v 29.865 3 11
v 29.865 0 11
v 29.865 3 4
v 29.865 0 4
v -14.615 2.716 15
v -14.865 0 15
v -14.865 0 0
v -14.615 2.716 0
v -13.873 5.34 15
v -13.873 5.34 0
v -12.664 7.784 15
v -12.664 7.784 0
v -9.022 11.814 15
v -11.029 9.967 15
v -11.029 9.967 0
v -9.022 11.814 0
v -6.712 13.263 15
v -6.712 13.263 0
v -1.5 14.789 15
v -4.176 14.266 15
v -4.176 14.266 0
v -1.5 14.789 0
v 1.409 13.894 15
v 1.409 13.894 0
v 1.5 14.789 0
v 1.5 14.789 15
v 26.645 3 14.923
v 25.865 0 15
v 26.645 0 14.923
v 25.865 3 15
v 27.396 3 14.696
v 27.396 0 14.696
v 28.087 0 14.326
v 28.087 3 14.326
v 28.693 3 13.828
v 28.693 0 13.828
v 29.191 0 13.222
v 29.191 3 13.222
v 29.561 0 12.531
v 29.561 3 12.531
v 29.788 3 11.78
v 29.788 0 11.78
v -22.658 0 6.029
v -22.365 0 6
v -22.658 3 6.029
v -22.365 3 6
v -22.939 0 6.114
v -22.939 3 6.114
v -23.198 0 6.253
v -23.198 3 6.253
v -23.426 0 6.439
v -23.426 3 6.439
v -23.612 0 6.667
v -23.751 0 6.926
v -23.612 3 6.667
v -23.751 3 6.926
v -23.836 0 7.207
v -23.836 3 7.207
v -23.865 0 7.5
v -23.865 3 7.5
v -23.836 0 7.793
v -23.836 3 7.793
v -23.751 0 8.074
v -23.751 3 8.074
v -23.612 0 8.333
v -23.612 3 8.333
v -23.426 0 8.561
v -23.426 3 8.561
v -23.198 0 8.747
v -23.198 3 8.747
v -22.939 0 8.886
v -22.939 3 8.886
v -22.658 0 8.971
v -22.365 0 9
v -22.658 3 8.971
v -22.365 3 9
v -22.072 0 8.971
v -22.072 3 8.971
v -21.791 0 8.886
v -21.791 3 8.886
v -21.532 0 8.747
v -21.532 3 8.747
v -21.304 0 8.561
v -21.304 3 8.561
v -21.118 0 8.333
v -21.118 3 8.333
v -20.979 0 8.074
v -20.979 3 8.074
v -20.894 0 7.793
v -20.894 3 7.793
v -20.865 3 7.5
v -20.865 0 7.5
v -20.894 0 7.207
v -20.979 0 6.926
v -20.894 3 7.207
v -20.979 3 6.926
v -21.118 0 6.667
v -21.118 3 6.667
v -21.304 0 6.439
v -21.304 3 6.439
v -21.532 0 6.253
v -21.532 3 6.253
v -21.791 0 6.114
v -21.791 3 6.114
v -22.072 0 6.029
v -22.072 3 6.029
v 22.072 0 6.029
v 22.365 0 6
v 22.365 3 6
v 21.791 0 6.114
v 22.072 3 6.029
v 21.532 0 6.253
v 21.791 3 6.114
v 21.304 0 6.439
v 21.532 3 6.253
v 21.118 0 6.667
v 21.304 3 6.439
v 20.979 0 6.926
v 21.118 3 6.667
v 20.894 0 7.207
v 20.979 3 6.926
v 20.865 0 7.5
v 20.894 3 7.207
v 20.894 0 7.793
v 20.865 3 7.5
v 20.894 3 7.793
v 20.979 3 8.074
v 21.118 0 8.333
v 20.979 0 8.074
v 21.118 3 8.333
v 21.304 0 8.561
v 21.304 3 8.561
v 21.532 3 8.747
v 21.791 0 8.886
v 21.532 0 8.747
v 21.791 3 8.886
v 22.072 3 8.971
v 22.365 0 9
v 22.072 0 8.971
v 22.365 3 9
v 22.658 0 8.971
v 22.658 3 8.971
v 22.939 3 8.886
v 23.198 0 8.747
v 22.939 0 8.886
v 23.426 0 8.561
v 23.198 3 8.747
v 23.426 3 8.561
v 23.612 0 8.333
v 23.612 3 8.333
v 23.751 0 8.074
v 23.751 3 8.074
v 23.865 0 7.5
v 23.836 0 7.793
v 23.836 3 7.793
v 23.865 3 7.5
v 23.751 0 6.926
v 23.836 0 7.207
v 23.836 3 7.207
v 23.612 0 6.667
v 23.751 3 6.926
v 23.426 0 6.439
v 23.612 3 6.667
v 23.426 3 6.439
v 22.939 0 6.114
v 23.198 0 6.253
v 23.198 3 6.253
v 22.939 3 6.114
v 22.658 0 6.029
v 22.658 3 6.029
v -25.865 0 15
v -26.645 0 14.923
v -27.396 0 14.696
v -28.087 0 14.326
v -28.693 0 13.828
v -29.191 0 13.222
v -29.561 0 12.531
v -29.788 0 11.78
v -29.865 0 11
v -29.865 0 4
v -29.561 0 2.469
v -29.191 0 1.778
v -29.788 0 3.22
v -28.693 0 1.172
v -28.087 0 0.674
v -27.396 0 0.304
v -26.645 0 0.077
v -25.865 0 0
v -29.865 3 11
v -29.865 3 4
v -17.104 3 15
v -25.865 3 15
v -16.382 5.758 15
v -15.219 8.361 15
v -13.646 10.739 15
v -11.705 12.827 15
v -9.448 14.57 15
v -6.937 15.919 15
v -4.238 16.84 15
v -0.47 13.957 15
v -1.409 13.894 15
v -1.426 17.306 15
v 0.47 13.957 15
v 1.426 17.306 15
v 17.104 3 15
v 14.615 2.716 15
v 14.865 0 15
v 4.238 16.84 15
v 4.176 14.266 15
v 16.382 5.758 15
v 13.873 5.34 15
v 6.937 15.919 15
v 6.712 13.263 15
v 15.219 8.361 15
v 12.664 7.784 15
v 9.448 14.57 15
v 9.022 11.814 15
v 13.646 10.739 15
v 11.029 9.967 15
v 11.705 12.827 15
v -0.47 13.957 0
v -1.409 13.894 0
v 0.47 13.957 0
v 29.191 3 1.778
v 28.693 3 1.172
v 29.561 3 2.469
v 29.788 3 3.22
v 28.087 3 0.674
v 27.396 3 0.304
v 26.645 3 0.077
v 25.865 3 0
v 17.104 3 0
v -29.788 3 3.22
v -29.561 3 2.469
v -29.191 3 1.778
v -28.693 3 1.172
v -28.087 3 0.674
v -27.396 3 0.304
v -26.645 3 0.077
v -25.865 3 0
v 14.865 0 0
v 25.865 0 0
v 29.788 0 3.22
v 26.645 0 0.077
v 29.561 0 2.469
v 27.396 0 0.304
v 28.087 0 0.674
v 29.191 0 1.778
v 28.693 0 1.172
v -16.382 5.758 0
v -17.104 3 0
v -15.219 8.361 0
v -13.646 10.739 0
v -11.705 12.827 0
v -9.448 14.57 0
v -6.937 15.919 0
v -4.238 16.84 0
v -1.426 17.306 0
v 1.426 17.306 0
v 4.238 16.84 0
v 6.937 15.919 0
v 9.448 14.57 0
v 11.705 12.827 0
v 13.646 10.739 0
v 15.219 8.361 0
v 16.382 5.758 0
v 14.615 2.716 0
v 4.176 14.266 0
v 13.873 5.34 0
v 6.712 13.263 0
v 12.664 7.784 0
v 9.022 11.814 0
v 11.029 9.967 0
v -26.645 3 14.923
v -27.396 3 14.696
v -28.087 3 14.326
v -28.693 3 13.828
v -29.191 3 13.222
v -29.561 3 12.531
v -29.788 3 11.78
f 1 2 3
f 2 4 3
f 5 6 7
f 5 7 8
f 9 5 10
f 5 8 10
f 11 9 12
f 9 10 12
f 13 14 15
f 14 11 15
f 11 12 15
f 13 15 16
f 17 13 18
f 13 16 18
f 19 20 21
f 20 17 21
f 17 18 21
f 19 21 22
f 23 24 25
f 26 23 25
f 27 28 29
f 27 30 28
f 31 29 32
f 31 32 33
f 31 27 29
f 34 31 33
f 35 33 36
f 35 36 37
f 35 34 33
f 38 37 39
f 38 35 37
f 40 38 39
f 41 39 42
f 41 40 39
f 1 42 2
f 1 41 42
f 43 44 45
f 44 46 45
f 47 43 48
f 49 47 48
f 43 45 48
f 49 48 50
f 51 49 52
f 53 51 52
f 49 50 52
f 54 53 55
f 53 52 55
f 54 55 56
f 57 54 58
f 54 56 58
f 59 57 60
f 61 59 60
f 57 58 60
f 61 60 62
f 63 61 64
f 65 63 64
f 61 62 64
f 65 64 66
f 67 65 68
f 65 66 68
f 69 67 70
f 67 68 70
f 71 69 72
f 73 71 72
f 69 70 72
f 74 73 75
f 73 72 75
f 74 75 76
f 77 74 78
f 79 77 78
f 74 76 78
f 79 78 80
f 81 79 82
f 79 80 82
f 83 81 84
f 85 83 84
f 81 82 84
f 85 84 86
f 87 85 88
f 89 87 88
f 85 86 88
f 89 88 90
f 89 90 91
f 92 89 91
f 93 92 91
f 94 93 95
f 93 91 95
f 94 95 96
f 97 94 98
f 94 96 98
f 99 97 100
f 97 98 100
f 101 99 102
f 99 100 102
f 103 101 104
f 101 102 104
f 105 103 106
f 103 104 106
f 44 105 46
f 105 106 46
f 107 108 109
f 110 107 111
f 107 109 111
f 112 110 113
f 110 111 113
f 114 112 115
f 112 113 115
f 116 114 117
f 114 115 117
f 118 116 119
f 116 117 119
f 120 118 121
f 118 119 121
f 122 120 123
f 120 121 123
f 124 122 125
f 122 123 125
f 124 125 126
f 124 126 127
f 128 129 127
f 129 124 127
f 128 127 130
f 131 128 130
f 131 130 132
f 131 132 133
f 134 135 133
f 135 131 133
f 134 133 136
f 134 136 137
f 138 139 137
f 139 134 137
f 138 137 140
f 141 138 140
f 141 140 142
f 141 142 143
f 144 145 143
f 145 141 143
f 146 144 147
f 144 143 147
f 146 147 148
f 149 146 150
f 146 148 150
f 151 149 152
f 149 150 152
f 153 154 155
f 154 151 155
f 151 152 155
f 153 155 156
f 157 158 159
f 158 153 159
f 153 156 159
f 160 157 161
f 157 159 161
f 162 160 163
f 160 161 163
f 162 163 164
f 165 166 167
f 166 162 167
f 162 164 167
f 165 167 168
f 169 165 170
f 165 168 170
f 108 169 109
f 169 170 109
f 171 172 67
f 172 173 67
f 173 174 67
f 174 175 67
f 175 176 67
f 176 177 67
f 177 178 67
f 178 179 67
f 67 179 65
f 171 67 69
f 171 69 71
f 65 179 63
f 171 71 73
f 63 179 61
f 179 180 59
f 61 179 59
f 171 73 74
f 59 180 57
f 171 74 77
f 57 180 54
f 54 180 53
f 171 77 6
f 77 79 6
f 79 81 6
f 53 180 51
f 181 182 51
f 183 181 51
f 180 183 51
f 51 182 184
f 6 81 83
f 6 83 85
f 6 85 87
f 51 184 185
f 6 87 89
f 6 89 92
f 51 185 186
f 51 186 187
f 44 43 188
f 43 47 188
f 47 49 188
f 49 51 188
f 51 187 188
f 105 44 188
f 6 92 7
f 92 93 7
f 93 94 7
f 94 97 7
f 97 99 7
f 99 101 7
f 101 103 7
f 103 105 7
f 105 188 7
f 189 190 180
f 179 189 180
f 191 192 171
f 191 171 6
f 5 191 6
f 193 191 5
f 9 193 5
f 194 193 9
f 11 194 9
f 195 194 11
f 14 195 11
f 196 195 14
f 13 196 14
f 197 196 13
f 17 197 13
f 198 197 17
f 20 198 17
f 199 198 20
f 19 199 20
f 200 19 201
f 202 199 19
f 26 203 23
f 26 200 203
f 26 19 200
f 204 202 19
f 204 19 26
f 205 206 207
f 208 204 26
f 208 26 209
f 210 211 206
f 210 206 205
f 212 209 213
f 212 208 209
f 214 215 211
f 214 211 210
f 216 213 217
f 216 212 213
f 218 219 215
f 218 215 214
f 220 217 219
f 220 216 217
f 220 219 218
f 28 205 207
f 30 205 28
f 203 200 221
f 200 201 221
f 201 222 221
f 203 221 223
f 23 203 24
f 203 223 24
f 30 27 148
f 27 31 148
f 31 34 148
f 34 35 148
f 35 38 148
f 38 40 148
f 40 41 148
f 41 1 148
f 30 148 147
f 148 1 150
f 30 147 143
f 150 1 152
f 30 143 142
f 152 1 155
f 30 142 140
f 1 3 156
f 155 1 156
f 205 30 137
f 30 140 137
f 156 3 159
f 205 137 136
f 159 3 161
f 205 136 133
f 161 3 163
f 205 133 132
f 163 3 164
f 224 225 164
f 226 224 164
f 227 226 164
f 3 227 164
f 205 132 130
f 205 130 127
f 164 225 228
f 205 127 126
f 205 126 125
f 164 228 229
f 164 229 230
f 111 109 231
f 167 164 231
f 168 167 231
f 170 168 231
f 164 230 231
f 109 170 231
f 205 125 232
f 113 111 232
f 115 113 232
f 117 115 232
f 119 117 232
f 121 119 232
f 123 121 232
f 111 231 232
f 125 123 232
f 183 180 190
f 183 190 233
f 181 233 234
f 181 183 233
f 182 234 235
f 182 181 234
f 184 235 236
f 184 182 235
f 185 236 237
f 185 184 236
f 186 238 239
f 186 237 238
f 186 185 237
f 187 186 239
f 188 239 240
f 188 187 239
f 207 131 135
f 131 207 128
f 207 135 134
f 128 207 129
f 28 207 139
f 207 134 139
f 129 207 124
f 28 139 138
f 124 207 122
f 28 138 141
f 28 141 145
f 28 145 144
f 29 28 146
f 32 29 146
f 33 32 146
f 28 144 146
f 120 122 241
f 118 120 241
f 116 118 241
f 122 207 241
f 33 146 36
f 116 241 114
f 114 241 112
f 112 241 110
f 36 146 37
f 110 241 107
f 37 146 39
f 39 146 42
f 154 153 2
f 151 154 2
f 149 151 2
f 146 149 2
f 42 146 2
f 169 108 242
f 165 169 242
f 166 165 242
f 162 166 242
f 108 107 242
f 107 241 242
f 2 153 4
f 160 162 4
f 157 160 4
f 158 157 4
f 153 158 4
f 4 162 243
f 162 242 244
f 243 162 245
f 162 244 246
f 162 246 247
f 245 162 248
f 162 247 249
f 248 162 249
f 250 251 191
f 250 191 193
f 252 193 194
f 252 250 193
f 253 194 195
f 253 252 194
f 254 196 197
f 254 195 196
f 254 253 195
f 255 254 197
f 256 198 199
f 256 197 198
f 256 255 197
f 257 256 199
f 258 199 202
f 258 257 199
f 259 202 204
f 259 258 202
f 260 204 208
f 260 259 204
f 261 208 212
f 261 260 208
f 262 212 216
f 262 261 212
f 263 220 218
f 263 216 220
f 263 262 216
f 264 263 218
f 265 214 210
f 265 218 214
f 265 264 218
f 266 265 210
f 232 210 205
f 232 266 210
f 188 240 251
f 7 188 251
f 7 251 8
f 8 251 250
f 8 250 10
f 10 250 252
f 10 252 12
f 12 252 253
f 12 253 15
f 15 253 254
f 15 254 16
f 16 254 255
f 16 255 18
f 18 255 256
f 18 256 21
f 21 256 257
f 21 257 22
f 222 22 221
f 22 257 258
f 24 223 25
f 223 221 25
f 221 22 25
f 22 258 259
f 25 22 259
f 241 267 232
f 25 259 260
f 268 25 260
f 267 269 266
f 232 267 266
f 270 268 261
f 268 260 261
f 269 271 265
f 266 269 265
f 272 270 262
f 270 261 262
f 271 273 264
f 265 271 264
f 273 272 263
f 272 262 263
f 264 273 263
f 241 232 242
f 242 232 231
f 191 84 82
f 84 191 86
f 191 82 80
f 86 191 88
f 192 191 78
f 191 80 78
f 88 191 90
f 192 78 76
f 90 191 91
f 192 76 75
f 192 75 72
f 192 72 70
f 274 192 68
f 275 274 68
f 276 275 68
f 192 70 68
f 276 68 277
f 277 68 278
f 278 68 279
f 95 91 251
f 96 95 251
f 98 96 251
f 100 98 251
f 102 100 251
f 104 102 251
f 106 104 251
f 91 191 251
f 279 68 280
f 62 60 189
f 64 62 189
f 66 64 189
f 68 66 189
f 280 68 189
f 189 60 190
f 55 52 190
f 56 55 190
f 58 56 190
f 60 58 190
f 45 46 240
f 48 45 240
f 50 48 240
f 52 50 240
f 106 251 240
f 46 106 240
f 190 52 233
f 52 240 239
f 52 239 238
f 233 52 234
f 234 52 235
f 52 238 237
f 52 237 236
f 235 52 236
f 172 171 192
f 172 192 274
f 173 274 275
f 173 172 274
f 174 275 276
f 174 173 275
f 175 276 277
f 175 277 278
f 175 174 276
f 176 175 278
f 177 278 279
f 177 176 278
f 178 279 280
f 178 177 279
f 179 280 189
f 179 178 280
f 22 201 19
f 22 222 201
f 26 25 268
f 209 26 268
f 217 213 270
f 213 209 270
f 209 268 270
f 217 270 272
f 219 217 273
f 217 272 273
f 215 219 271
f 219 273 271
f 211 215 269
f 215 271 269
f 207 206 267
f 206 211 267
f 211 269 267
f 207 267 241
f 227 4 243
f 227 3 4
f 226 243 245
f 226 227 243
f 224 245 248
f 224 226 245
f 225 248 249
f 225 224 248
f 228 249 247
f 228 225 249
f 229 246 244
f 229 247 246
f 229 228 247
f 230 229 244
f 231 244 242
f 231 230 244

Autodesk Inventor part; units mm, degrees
ref_plane "YZ Plane" through (0, 0, 0) normal (1, 0, 0) x (0, 1, 0)
ref_plane "XZ Plane" through (0, 0, 0) normal (0, 1, 0) x (-1, 0, 0)
ref_plane "XY Plane" through (0, 0, 0) normal (0, 0, 1) x (1, 0, 0)
sketch "Sketch1" plane through (0, 0, 0) normal (0, 0, 1) x (1, 0, 0)
  arc A0 (14.865, 0) -> (-14.865, 0) centre (0, 0) ccw
  arc A1 (17.1039, 3) -> (-17.1039, 3) centre (0, 0) ccw
  line L0 (-17.1039, 3) -> (-29.865, 3)
  line L1 (-29.865, 3) -> (-29.865, 0)
  line L2 (-29.865, 0) -> (-14.865, 0)
  line L3 (14.865, 0) -> (29.865, 0)
  line L4 (29.865, 0) -> (29.865, 3)
  line L5 (29.865, 3) -> (17.1039, 3)
  arc A2 (1.4092, 13.8937) -> (-1.4092, 13.8937) centre (0, 0) ccw
  line L6 (-1.4092, 13.8937) -> (-1.5, 14.7891)
  line L7 (1.4092, 13.8937) -> (1.5, 14.7891)
  point P0 (0, 13.965)
  dimension "d0" = 3
  dimension "d1" = 14.865
  dimension "d3" = 2.5
  dimension "d8" = 15
  dimension "d17" = 0.9
  dimension "d18" = 3
extrude "Extrusion1" add sketch "Sketch1" along normal blind 15
sketch "Sketch2" plane through (-29.865, 0, 0) normal (0, -1, 0) x (1, 0, 0)
  line L0 (0, 15) -> (15, 15) projected
  line L1 (0, 0) -> (0, 15) projected
  point P0 (29.865, 0)
  point P1 (7.5, 7.5)
  point P2 (7.5, 15)
  point P3 (0, 7.5)
hole "Hole1" at (-22.365, 0, 7.5) direction (0, 1, 0) diameter 3 end through all
mirror "Mirror1" about plane through (0, 0, 0) normal (1, 0, 0) of "Hole1"
fillet "Fillet1" radius 4 4 edges at (-29.865, 1.5, 0) (-29.865, 1.5, 15) (29.865, 1.5, 15) (29.865, 1.5, 0)
properties part number "Motor Mount C-Clamp Top"
